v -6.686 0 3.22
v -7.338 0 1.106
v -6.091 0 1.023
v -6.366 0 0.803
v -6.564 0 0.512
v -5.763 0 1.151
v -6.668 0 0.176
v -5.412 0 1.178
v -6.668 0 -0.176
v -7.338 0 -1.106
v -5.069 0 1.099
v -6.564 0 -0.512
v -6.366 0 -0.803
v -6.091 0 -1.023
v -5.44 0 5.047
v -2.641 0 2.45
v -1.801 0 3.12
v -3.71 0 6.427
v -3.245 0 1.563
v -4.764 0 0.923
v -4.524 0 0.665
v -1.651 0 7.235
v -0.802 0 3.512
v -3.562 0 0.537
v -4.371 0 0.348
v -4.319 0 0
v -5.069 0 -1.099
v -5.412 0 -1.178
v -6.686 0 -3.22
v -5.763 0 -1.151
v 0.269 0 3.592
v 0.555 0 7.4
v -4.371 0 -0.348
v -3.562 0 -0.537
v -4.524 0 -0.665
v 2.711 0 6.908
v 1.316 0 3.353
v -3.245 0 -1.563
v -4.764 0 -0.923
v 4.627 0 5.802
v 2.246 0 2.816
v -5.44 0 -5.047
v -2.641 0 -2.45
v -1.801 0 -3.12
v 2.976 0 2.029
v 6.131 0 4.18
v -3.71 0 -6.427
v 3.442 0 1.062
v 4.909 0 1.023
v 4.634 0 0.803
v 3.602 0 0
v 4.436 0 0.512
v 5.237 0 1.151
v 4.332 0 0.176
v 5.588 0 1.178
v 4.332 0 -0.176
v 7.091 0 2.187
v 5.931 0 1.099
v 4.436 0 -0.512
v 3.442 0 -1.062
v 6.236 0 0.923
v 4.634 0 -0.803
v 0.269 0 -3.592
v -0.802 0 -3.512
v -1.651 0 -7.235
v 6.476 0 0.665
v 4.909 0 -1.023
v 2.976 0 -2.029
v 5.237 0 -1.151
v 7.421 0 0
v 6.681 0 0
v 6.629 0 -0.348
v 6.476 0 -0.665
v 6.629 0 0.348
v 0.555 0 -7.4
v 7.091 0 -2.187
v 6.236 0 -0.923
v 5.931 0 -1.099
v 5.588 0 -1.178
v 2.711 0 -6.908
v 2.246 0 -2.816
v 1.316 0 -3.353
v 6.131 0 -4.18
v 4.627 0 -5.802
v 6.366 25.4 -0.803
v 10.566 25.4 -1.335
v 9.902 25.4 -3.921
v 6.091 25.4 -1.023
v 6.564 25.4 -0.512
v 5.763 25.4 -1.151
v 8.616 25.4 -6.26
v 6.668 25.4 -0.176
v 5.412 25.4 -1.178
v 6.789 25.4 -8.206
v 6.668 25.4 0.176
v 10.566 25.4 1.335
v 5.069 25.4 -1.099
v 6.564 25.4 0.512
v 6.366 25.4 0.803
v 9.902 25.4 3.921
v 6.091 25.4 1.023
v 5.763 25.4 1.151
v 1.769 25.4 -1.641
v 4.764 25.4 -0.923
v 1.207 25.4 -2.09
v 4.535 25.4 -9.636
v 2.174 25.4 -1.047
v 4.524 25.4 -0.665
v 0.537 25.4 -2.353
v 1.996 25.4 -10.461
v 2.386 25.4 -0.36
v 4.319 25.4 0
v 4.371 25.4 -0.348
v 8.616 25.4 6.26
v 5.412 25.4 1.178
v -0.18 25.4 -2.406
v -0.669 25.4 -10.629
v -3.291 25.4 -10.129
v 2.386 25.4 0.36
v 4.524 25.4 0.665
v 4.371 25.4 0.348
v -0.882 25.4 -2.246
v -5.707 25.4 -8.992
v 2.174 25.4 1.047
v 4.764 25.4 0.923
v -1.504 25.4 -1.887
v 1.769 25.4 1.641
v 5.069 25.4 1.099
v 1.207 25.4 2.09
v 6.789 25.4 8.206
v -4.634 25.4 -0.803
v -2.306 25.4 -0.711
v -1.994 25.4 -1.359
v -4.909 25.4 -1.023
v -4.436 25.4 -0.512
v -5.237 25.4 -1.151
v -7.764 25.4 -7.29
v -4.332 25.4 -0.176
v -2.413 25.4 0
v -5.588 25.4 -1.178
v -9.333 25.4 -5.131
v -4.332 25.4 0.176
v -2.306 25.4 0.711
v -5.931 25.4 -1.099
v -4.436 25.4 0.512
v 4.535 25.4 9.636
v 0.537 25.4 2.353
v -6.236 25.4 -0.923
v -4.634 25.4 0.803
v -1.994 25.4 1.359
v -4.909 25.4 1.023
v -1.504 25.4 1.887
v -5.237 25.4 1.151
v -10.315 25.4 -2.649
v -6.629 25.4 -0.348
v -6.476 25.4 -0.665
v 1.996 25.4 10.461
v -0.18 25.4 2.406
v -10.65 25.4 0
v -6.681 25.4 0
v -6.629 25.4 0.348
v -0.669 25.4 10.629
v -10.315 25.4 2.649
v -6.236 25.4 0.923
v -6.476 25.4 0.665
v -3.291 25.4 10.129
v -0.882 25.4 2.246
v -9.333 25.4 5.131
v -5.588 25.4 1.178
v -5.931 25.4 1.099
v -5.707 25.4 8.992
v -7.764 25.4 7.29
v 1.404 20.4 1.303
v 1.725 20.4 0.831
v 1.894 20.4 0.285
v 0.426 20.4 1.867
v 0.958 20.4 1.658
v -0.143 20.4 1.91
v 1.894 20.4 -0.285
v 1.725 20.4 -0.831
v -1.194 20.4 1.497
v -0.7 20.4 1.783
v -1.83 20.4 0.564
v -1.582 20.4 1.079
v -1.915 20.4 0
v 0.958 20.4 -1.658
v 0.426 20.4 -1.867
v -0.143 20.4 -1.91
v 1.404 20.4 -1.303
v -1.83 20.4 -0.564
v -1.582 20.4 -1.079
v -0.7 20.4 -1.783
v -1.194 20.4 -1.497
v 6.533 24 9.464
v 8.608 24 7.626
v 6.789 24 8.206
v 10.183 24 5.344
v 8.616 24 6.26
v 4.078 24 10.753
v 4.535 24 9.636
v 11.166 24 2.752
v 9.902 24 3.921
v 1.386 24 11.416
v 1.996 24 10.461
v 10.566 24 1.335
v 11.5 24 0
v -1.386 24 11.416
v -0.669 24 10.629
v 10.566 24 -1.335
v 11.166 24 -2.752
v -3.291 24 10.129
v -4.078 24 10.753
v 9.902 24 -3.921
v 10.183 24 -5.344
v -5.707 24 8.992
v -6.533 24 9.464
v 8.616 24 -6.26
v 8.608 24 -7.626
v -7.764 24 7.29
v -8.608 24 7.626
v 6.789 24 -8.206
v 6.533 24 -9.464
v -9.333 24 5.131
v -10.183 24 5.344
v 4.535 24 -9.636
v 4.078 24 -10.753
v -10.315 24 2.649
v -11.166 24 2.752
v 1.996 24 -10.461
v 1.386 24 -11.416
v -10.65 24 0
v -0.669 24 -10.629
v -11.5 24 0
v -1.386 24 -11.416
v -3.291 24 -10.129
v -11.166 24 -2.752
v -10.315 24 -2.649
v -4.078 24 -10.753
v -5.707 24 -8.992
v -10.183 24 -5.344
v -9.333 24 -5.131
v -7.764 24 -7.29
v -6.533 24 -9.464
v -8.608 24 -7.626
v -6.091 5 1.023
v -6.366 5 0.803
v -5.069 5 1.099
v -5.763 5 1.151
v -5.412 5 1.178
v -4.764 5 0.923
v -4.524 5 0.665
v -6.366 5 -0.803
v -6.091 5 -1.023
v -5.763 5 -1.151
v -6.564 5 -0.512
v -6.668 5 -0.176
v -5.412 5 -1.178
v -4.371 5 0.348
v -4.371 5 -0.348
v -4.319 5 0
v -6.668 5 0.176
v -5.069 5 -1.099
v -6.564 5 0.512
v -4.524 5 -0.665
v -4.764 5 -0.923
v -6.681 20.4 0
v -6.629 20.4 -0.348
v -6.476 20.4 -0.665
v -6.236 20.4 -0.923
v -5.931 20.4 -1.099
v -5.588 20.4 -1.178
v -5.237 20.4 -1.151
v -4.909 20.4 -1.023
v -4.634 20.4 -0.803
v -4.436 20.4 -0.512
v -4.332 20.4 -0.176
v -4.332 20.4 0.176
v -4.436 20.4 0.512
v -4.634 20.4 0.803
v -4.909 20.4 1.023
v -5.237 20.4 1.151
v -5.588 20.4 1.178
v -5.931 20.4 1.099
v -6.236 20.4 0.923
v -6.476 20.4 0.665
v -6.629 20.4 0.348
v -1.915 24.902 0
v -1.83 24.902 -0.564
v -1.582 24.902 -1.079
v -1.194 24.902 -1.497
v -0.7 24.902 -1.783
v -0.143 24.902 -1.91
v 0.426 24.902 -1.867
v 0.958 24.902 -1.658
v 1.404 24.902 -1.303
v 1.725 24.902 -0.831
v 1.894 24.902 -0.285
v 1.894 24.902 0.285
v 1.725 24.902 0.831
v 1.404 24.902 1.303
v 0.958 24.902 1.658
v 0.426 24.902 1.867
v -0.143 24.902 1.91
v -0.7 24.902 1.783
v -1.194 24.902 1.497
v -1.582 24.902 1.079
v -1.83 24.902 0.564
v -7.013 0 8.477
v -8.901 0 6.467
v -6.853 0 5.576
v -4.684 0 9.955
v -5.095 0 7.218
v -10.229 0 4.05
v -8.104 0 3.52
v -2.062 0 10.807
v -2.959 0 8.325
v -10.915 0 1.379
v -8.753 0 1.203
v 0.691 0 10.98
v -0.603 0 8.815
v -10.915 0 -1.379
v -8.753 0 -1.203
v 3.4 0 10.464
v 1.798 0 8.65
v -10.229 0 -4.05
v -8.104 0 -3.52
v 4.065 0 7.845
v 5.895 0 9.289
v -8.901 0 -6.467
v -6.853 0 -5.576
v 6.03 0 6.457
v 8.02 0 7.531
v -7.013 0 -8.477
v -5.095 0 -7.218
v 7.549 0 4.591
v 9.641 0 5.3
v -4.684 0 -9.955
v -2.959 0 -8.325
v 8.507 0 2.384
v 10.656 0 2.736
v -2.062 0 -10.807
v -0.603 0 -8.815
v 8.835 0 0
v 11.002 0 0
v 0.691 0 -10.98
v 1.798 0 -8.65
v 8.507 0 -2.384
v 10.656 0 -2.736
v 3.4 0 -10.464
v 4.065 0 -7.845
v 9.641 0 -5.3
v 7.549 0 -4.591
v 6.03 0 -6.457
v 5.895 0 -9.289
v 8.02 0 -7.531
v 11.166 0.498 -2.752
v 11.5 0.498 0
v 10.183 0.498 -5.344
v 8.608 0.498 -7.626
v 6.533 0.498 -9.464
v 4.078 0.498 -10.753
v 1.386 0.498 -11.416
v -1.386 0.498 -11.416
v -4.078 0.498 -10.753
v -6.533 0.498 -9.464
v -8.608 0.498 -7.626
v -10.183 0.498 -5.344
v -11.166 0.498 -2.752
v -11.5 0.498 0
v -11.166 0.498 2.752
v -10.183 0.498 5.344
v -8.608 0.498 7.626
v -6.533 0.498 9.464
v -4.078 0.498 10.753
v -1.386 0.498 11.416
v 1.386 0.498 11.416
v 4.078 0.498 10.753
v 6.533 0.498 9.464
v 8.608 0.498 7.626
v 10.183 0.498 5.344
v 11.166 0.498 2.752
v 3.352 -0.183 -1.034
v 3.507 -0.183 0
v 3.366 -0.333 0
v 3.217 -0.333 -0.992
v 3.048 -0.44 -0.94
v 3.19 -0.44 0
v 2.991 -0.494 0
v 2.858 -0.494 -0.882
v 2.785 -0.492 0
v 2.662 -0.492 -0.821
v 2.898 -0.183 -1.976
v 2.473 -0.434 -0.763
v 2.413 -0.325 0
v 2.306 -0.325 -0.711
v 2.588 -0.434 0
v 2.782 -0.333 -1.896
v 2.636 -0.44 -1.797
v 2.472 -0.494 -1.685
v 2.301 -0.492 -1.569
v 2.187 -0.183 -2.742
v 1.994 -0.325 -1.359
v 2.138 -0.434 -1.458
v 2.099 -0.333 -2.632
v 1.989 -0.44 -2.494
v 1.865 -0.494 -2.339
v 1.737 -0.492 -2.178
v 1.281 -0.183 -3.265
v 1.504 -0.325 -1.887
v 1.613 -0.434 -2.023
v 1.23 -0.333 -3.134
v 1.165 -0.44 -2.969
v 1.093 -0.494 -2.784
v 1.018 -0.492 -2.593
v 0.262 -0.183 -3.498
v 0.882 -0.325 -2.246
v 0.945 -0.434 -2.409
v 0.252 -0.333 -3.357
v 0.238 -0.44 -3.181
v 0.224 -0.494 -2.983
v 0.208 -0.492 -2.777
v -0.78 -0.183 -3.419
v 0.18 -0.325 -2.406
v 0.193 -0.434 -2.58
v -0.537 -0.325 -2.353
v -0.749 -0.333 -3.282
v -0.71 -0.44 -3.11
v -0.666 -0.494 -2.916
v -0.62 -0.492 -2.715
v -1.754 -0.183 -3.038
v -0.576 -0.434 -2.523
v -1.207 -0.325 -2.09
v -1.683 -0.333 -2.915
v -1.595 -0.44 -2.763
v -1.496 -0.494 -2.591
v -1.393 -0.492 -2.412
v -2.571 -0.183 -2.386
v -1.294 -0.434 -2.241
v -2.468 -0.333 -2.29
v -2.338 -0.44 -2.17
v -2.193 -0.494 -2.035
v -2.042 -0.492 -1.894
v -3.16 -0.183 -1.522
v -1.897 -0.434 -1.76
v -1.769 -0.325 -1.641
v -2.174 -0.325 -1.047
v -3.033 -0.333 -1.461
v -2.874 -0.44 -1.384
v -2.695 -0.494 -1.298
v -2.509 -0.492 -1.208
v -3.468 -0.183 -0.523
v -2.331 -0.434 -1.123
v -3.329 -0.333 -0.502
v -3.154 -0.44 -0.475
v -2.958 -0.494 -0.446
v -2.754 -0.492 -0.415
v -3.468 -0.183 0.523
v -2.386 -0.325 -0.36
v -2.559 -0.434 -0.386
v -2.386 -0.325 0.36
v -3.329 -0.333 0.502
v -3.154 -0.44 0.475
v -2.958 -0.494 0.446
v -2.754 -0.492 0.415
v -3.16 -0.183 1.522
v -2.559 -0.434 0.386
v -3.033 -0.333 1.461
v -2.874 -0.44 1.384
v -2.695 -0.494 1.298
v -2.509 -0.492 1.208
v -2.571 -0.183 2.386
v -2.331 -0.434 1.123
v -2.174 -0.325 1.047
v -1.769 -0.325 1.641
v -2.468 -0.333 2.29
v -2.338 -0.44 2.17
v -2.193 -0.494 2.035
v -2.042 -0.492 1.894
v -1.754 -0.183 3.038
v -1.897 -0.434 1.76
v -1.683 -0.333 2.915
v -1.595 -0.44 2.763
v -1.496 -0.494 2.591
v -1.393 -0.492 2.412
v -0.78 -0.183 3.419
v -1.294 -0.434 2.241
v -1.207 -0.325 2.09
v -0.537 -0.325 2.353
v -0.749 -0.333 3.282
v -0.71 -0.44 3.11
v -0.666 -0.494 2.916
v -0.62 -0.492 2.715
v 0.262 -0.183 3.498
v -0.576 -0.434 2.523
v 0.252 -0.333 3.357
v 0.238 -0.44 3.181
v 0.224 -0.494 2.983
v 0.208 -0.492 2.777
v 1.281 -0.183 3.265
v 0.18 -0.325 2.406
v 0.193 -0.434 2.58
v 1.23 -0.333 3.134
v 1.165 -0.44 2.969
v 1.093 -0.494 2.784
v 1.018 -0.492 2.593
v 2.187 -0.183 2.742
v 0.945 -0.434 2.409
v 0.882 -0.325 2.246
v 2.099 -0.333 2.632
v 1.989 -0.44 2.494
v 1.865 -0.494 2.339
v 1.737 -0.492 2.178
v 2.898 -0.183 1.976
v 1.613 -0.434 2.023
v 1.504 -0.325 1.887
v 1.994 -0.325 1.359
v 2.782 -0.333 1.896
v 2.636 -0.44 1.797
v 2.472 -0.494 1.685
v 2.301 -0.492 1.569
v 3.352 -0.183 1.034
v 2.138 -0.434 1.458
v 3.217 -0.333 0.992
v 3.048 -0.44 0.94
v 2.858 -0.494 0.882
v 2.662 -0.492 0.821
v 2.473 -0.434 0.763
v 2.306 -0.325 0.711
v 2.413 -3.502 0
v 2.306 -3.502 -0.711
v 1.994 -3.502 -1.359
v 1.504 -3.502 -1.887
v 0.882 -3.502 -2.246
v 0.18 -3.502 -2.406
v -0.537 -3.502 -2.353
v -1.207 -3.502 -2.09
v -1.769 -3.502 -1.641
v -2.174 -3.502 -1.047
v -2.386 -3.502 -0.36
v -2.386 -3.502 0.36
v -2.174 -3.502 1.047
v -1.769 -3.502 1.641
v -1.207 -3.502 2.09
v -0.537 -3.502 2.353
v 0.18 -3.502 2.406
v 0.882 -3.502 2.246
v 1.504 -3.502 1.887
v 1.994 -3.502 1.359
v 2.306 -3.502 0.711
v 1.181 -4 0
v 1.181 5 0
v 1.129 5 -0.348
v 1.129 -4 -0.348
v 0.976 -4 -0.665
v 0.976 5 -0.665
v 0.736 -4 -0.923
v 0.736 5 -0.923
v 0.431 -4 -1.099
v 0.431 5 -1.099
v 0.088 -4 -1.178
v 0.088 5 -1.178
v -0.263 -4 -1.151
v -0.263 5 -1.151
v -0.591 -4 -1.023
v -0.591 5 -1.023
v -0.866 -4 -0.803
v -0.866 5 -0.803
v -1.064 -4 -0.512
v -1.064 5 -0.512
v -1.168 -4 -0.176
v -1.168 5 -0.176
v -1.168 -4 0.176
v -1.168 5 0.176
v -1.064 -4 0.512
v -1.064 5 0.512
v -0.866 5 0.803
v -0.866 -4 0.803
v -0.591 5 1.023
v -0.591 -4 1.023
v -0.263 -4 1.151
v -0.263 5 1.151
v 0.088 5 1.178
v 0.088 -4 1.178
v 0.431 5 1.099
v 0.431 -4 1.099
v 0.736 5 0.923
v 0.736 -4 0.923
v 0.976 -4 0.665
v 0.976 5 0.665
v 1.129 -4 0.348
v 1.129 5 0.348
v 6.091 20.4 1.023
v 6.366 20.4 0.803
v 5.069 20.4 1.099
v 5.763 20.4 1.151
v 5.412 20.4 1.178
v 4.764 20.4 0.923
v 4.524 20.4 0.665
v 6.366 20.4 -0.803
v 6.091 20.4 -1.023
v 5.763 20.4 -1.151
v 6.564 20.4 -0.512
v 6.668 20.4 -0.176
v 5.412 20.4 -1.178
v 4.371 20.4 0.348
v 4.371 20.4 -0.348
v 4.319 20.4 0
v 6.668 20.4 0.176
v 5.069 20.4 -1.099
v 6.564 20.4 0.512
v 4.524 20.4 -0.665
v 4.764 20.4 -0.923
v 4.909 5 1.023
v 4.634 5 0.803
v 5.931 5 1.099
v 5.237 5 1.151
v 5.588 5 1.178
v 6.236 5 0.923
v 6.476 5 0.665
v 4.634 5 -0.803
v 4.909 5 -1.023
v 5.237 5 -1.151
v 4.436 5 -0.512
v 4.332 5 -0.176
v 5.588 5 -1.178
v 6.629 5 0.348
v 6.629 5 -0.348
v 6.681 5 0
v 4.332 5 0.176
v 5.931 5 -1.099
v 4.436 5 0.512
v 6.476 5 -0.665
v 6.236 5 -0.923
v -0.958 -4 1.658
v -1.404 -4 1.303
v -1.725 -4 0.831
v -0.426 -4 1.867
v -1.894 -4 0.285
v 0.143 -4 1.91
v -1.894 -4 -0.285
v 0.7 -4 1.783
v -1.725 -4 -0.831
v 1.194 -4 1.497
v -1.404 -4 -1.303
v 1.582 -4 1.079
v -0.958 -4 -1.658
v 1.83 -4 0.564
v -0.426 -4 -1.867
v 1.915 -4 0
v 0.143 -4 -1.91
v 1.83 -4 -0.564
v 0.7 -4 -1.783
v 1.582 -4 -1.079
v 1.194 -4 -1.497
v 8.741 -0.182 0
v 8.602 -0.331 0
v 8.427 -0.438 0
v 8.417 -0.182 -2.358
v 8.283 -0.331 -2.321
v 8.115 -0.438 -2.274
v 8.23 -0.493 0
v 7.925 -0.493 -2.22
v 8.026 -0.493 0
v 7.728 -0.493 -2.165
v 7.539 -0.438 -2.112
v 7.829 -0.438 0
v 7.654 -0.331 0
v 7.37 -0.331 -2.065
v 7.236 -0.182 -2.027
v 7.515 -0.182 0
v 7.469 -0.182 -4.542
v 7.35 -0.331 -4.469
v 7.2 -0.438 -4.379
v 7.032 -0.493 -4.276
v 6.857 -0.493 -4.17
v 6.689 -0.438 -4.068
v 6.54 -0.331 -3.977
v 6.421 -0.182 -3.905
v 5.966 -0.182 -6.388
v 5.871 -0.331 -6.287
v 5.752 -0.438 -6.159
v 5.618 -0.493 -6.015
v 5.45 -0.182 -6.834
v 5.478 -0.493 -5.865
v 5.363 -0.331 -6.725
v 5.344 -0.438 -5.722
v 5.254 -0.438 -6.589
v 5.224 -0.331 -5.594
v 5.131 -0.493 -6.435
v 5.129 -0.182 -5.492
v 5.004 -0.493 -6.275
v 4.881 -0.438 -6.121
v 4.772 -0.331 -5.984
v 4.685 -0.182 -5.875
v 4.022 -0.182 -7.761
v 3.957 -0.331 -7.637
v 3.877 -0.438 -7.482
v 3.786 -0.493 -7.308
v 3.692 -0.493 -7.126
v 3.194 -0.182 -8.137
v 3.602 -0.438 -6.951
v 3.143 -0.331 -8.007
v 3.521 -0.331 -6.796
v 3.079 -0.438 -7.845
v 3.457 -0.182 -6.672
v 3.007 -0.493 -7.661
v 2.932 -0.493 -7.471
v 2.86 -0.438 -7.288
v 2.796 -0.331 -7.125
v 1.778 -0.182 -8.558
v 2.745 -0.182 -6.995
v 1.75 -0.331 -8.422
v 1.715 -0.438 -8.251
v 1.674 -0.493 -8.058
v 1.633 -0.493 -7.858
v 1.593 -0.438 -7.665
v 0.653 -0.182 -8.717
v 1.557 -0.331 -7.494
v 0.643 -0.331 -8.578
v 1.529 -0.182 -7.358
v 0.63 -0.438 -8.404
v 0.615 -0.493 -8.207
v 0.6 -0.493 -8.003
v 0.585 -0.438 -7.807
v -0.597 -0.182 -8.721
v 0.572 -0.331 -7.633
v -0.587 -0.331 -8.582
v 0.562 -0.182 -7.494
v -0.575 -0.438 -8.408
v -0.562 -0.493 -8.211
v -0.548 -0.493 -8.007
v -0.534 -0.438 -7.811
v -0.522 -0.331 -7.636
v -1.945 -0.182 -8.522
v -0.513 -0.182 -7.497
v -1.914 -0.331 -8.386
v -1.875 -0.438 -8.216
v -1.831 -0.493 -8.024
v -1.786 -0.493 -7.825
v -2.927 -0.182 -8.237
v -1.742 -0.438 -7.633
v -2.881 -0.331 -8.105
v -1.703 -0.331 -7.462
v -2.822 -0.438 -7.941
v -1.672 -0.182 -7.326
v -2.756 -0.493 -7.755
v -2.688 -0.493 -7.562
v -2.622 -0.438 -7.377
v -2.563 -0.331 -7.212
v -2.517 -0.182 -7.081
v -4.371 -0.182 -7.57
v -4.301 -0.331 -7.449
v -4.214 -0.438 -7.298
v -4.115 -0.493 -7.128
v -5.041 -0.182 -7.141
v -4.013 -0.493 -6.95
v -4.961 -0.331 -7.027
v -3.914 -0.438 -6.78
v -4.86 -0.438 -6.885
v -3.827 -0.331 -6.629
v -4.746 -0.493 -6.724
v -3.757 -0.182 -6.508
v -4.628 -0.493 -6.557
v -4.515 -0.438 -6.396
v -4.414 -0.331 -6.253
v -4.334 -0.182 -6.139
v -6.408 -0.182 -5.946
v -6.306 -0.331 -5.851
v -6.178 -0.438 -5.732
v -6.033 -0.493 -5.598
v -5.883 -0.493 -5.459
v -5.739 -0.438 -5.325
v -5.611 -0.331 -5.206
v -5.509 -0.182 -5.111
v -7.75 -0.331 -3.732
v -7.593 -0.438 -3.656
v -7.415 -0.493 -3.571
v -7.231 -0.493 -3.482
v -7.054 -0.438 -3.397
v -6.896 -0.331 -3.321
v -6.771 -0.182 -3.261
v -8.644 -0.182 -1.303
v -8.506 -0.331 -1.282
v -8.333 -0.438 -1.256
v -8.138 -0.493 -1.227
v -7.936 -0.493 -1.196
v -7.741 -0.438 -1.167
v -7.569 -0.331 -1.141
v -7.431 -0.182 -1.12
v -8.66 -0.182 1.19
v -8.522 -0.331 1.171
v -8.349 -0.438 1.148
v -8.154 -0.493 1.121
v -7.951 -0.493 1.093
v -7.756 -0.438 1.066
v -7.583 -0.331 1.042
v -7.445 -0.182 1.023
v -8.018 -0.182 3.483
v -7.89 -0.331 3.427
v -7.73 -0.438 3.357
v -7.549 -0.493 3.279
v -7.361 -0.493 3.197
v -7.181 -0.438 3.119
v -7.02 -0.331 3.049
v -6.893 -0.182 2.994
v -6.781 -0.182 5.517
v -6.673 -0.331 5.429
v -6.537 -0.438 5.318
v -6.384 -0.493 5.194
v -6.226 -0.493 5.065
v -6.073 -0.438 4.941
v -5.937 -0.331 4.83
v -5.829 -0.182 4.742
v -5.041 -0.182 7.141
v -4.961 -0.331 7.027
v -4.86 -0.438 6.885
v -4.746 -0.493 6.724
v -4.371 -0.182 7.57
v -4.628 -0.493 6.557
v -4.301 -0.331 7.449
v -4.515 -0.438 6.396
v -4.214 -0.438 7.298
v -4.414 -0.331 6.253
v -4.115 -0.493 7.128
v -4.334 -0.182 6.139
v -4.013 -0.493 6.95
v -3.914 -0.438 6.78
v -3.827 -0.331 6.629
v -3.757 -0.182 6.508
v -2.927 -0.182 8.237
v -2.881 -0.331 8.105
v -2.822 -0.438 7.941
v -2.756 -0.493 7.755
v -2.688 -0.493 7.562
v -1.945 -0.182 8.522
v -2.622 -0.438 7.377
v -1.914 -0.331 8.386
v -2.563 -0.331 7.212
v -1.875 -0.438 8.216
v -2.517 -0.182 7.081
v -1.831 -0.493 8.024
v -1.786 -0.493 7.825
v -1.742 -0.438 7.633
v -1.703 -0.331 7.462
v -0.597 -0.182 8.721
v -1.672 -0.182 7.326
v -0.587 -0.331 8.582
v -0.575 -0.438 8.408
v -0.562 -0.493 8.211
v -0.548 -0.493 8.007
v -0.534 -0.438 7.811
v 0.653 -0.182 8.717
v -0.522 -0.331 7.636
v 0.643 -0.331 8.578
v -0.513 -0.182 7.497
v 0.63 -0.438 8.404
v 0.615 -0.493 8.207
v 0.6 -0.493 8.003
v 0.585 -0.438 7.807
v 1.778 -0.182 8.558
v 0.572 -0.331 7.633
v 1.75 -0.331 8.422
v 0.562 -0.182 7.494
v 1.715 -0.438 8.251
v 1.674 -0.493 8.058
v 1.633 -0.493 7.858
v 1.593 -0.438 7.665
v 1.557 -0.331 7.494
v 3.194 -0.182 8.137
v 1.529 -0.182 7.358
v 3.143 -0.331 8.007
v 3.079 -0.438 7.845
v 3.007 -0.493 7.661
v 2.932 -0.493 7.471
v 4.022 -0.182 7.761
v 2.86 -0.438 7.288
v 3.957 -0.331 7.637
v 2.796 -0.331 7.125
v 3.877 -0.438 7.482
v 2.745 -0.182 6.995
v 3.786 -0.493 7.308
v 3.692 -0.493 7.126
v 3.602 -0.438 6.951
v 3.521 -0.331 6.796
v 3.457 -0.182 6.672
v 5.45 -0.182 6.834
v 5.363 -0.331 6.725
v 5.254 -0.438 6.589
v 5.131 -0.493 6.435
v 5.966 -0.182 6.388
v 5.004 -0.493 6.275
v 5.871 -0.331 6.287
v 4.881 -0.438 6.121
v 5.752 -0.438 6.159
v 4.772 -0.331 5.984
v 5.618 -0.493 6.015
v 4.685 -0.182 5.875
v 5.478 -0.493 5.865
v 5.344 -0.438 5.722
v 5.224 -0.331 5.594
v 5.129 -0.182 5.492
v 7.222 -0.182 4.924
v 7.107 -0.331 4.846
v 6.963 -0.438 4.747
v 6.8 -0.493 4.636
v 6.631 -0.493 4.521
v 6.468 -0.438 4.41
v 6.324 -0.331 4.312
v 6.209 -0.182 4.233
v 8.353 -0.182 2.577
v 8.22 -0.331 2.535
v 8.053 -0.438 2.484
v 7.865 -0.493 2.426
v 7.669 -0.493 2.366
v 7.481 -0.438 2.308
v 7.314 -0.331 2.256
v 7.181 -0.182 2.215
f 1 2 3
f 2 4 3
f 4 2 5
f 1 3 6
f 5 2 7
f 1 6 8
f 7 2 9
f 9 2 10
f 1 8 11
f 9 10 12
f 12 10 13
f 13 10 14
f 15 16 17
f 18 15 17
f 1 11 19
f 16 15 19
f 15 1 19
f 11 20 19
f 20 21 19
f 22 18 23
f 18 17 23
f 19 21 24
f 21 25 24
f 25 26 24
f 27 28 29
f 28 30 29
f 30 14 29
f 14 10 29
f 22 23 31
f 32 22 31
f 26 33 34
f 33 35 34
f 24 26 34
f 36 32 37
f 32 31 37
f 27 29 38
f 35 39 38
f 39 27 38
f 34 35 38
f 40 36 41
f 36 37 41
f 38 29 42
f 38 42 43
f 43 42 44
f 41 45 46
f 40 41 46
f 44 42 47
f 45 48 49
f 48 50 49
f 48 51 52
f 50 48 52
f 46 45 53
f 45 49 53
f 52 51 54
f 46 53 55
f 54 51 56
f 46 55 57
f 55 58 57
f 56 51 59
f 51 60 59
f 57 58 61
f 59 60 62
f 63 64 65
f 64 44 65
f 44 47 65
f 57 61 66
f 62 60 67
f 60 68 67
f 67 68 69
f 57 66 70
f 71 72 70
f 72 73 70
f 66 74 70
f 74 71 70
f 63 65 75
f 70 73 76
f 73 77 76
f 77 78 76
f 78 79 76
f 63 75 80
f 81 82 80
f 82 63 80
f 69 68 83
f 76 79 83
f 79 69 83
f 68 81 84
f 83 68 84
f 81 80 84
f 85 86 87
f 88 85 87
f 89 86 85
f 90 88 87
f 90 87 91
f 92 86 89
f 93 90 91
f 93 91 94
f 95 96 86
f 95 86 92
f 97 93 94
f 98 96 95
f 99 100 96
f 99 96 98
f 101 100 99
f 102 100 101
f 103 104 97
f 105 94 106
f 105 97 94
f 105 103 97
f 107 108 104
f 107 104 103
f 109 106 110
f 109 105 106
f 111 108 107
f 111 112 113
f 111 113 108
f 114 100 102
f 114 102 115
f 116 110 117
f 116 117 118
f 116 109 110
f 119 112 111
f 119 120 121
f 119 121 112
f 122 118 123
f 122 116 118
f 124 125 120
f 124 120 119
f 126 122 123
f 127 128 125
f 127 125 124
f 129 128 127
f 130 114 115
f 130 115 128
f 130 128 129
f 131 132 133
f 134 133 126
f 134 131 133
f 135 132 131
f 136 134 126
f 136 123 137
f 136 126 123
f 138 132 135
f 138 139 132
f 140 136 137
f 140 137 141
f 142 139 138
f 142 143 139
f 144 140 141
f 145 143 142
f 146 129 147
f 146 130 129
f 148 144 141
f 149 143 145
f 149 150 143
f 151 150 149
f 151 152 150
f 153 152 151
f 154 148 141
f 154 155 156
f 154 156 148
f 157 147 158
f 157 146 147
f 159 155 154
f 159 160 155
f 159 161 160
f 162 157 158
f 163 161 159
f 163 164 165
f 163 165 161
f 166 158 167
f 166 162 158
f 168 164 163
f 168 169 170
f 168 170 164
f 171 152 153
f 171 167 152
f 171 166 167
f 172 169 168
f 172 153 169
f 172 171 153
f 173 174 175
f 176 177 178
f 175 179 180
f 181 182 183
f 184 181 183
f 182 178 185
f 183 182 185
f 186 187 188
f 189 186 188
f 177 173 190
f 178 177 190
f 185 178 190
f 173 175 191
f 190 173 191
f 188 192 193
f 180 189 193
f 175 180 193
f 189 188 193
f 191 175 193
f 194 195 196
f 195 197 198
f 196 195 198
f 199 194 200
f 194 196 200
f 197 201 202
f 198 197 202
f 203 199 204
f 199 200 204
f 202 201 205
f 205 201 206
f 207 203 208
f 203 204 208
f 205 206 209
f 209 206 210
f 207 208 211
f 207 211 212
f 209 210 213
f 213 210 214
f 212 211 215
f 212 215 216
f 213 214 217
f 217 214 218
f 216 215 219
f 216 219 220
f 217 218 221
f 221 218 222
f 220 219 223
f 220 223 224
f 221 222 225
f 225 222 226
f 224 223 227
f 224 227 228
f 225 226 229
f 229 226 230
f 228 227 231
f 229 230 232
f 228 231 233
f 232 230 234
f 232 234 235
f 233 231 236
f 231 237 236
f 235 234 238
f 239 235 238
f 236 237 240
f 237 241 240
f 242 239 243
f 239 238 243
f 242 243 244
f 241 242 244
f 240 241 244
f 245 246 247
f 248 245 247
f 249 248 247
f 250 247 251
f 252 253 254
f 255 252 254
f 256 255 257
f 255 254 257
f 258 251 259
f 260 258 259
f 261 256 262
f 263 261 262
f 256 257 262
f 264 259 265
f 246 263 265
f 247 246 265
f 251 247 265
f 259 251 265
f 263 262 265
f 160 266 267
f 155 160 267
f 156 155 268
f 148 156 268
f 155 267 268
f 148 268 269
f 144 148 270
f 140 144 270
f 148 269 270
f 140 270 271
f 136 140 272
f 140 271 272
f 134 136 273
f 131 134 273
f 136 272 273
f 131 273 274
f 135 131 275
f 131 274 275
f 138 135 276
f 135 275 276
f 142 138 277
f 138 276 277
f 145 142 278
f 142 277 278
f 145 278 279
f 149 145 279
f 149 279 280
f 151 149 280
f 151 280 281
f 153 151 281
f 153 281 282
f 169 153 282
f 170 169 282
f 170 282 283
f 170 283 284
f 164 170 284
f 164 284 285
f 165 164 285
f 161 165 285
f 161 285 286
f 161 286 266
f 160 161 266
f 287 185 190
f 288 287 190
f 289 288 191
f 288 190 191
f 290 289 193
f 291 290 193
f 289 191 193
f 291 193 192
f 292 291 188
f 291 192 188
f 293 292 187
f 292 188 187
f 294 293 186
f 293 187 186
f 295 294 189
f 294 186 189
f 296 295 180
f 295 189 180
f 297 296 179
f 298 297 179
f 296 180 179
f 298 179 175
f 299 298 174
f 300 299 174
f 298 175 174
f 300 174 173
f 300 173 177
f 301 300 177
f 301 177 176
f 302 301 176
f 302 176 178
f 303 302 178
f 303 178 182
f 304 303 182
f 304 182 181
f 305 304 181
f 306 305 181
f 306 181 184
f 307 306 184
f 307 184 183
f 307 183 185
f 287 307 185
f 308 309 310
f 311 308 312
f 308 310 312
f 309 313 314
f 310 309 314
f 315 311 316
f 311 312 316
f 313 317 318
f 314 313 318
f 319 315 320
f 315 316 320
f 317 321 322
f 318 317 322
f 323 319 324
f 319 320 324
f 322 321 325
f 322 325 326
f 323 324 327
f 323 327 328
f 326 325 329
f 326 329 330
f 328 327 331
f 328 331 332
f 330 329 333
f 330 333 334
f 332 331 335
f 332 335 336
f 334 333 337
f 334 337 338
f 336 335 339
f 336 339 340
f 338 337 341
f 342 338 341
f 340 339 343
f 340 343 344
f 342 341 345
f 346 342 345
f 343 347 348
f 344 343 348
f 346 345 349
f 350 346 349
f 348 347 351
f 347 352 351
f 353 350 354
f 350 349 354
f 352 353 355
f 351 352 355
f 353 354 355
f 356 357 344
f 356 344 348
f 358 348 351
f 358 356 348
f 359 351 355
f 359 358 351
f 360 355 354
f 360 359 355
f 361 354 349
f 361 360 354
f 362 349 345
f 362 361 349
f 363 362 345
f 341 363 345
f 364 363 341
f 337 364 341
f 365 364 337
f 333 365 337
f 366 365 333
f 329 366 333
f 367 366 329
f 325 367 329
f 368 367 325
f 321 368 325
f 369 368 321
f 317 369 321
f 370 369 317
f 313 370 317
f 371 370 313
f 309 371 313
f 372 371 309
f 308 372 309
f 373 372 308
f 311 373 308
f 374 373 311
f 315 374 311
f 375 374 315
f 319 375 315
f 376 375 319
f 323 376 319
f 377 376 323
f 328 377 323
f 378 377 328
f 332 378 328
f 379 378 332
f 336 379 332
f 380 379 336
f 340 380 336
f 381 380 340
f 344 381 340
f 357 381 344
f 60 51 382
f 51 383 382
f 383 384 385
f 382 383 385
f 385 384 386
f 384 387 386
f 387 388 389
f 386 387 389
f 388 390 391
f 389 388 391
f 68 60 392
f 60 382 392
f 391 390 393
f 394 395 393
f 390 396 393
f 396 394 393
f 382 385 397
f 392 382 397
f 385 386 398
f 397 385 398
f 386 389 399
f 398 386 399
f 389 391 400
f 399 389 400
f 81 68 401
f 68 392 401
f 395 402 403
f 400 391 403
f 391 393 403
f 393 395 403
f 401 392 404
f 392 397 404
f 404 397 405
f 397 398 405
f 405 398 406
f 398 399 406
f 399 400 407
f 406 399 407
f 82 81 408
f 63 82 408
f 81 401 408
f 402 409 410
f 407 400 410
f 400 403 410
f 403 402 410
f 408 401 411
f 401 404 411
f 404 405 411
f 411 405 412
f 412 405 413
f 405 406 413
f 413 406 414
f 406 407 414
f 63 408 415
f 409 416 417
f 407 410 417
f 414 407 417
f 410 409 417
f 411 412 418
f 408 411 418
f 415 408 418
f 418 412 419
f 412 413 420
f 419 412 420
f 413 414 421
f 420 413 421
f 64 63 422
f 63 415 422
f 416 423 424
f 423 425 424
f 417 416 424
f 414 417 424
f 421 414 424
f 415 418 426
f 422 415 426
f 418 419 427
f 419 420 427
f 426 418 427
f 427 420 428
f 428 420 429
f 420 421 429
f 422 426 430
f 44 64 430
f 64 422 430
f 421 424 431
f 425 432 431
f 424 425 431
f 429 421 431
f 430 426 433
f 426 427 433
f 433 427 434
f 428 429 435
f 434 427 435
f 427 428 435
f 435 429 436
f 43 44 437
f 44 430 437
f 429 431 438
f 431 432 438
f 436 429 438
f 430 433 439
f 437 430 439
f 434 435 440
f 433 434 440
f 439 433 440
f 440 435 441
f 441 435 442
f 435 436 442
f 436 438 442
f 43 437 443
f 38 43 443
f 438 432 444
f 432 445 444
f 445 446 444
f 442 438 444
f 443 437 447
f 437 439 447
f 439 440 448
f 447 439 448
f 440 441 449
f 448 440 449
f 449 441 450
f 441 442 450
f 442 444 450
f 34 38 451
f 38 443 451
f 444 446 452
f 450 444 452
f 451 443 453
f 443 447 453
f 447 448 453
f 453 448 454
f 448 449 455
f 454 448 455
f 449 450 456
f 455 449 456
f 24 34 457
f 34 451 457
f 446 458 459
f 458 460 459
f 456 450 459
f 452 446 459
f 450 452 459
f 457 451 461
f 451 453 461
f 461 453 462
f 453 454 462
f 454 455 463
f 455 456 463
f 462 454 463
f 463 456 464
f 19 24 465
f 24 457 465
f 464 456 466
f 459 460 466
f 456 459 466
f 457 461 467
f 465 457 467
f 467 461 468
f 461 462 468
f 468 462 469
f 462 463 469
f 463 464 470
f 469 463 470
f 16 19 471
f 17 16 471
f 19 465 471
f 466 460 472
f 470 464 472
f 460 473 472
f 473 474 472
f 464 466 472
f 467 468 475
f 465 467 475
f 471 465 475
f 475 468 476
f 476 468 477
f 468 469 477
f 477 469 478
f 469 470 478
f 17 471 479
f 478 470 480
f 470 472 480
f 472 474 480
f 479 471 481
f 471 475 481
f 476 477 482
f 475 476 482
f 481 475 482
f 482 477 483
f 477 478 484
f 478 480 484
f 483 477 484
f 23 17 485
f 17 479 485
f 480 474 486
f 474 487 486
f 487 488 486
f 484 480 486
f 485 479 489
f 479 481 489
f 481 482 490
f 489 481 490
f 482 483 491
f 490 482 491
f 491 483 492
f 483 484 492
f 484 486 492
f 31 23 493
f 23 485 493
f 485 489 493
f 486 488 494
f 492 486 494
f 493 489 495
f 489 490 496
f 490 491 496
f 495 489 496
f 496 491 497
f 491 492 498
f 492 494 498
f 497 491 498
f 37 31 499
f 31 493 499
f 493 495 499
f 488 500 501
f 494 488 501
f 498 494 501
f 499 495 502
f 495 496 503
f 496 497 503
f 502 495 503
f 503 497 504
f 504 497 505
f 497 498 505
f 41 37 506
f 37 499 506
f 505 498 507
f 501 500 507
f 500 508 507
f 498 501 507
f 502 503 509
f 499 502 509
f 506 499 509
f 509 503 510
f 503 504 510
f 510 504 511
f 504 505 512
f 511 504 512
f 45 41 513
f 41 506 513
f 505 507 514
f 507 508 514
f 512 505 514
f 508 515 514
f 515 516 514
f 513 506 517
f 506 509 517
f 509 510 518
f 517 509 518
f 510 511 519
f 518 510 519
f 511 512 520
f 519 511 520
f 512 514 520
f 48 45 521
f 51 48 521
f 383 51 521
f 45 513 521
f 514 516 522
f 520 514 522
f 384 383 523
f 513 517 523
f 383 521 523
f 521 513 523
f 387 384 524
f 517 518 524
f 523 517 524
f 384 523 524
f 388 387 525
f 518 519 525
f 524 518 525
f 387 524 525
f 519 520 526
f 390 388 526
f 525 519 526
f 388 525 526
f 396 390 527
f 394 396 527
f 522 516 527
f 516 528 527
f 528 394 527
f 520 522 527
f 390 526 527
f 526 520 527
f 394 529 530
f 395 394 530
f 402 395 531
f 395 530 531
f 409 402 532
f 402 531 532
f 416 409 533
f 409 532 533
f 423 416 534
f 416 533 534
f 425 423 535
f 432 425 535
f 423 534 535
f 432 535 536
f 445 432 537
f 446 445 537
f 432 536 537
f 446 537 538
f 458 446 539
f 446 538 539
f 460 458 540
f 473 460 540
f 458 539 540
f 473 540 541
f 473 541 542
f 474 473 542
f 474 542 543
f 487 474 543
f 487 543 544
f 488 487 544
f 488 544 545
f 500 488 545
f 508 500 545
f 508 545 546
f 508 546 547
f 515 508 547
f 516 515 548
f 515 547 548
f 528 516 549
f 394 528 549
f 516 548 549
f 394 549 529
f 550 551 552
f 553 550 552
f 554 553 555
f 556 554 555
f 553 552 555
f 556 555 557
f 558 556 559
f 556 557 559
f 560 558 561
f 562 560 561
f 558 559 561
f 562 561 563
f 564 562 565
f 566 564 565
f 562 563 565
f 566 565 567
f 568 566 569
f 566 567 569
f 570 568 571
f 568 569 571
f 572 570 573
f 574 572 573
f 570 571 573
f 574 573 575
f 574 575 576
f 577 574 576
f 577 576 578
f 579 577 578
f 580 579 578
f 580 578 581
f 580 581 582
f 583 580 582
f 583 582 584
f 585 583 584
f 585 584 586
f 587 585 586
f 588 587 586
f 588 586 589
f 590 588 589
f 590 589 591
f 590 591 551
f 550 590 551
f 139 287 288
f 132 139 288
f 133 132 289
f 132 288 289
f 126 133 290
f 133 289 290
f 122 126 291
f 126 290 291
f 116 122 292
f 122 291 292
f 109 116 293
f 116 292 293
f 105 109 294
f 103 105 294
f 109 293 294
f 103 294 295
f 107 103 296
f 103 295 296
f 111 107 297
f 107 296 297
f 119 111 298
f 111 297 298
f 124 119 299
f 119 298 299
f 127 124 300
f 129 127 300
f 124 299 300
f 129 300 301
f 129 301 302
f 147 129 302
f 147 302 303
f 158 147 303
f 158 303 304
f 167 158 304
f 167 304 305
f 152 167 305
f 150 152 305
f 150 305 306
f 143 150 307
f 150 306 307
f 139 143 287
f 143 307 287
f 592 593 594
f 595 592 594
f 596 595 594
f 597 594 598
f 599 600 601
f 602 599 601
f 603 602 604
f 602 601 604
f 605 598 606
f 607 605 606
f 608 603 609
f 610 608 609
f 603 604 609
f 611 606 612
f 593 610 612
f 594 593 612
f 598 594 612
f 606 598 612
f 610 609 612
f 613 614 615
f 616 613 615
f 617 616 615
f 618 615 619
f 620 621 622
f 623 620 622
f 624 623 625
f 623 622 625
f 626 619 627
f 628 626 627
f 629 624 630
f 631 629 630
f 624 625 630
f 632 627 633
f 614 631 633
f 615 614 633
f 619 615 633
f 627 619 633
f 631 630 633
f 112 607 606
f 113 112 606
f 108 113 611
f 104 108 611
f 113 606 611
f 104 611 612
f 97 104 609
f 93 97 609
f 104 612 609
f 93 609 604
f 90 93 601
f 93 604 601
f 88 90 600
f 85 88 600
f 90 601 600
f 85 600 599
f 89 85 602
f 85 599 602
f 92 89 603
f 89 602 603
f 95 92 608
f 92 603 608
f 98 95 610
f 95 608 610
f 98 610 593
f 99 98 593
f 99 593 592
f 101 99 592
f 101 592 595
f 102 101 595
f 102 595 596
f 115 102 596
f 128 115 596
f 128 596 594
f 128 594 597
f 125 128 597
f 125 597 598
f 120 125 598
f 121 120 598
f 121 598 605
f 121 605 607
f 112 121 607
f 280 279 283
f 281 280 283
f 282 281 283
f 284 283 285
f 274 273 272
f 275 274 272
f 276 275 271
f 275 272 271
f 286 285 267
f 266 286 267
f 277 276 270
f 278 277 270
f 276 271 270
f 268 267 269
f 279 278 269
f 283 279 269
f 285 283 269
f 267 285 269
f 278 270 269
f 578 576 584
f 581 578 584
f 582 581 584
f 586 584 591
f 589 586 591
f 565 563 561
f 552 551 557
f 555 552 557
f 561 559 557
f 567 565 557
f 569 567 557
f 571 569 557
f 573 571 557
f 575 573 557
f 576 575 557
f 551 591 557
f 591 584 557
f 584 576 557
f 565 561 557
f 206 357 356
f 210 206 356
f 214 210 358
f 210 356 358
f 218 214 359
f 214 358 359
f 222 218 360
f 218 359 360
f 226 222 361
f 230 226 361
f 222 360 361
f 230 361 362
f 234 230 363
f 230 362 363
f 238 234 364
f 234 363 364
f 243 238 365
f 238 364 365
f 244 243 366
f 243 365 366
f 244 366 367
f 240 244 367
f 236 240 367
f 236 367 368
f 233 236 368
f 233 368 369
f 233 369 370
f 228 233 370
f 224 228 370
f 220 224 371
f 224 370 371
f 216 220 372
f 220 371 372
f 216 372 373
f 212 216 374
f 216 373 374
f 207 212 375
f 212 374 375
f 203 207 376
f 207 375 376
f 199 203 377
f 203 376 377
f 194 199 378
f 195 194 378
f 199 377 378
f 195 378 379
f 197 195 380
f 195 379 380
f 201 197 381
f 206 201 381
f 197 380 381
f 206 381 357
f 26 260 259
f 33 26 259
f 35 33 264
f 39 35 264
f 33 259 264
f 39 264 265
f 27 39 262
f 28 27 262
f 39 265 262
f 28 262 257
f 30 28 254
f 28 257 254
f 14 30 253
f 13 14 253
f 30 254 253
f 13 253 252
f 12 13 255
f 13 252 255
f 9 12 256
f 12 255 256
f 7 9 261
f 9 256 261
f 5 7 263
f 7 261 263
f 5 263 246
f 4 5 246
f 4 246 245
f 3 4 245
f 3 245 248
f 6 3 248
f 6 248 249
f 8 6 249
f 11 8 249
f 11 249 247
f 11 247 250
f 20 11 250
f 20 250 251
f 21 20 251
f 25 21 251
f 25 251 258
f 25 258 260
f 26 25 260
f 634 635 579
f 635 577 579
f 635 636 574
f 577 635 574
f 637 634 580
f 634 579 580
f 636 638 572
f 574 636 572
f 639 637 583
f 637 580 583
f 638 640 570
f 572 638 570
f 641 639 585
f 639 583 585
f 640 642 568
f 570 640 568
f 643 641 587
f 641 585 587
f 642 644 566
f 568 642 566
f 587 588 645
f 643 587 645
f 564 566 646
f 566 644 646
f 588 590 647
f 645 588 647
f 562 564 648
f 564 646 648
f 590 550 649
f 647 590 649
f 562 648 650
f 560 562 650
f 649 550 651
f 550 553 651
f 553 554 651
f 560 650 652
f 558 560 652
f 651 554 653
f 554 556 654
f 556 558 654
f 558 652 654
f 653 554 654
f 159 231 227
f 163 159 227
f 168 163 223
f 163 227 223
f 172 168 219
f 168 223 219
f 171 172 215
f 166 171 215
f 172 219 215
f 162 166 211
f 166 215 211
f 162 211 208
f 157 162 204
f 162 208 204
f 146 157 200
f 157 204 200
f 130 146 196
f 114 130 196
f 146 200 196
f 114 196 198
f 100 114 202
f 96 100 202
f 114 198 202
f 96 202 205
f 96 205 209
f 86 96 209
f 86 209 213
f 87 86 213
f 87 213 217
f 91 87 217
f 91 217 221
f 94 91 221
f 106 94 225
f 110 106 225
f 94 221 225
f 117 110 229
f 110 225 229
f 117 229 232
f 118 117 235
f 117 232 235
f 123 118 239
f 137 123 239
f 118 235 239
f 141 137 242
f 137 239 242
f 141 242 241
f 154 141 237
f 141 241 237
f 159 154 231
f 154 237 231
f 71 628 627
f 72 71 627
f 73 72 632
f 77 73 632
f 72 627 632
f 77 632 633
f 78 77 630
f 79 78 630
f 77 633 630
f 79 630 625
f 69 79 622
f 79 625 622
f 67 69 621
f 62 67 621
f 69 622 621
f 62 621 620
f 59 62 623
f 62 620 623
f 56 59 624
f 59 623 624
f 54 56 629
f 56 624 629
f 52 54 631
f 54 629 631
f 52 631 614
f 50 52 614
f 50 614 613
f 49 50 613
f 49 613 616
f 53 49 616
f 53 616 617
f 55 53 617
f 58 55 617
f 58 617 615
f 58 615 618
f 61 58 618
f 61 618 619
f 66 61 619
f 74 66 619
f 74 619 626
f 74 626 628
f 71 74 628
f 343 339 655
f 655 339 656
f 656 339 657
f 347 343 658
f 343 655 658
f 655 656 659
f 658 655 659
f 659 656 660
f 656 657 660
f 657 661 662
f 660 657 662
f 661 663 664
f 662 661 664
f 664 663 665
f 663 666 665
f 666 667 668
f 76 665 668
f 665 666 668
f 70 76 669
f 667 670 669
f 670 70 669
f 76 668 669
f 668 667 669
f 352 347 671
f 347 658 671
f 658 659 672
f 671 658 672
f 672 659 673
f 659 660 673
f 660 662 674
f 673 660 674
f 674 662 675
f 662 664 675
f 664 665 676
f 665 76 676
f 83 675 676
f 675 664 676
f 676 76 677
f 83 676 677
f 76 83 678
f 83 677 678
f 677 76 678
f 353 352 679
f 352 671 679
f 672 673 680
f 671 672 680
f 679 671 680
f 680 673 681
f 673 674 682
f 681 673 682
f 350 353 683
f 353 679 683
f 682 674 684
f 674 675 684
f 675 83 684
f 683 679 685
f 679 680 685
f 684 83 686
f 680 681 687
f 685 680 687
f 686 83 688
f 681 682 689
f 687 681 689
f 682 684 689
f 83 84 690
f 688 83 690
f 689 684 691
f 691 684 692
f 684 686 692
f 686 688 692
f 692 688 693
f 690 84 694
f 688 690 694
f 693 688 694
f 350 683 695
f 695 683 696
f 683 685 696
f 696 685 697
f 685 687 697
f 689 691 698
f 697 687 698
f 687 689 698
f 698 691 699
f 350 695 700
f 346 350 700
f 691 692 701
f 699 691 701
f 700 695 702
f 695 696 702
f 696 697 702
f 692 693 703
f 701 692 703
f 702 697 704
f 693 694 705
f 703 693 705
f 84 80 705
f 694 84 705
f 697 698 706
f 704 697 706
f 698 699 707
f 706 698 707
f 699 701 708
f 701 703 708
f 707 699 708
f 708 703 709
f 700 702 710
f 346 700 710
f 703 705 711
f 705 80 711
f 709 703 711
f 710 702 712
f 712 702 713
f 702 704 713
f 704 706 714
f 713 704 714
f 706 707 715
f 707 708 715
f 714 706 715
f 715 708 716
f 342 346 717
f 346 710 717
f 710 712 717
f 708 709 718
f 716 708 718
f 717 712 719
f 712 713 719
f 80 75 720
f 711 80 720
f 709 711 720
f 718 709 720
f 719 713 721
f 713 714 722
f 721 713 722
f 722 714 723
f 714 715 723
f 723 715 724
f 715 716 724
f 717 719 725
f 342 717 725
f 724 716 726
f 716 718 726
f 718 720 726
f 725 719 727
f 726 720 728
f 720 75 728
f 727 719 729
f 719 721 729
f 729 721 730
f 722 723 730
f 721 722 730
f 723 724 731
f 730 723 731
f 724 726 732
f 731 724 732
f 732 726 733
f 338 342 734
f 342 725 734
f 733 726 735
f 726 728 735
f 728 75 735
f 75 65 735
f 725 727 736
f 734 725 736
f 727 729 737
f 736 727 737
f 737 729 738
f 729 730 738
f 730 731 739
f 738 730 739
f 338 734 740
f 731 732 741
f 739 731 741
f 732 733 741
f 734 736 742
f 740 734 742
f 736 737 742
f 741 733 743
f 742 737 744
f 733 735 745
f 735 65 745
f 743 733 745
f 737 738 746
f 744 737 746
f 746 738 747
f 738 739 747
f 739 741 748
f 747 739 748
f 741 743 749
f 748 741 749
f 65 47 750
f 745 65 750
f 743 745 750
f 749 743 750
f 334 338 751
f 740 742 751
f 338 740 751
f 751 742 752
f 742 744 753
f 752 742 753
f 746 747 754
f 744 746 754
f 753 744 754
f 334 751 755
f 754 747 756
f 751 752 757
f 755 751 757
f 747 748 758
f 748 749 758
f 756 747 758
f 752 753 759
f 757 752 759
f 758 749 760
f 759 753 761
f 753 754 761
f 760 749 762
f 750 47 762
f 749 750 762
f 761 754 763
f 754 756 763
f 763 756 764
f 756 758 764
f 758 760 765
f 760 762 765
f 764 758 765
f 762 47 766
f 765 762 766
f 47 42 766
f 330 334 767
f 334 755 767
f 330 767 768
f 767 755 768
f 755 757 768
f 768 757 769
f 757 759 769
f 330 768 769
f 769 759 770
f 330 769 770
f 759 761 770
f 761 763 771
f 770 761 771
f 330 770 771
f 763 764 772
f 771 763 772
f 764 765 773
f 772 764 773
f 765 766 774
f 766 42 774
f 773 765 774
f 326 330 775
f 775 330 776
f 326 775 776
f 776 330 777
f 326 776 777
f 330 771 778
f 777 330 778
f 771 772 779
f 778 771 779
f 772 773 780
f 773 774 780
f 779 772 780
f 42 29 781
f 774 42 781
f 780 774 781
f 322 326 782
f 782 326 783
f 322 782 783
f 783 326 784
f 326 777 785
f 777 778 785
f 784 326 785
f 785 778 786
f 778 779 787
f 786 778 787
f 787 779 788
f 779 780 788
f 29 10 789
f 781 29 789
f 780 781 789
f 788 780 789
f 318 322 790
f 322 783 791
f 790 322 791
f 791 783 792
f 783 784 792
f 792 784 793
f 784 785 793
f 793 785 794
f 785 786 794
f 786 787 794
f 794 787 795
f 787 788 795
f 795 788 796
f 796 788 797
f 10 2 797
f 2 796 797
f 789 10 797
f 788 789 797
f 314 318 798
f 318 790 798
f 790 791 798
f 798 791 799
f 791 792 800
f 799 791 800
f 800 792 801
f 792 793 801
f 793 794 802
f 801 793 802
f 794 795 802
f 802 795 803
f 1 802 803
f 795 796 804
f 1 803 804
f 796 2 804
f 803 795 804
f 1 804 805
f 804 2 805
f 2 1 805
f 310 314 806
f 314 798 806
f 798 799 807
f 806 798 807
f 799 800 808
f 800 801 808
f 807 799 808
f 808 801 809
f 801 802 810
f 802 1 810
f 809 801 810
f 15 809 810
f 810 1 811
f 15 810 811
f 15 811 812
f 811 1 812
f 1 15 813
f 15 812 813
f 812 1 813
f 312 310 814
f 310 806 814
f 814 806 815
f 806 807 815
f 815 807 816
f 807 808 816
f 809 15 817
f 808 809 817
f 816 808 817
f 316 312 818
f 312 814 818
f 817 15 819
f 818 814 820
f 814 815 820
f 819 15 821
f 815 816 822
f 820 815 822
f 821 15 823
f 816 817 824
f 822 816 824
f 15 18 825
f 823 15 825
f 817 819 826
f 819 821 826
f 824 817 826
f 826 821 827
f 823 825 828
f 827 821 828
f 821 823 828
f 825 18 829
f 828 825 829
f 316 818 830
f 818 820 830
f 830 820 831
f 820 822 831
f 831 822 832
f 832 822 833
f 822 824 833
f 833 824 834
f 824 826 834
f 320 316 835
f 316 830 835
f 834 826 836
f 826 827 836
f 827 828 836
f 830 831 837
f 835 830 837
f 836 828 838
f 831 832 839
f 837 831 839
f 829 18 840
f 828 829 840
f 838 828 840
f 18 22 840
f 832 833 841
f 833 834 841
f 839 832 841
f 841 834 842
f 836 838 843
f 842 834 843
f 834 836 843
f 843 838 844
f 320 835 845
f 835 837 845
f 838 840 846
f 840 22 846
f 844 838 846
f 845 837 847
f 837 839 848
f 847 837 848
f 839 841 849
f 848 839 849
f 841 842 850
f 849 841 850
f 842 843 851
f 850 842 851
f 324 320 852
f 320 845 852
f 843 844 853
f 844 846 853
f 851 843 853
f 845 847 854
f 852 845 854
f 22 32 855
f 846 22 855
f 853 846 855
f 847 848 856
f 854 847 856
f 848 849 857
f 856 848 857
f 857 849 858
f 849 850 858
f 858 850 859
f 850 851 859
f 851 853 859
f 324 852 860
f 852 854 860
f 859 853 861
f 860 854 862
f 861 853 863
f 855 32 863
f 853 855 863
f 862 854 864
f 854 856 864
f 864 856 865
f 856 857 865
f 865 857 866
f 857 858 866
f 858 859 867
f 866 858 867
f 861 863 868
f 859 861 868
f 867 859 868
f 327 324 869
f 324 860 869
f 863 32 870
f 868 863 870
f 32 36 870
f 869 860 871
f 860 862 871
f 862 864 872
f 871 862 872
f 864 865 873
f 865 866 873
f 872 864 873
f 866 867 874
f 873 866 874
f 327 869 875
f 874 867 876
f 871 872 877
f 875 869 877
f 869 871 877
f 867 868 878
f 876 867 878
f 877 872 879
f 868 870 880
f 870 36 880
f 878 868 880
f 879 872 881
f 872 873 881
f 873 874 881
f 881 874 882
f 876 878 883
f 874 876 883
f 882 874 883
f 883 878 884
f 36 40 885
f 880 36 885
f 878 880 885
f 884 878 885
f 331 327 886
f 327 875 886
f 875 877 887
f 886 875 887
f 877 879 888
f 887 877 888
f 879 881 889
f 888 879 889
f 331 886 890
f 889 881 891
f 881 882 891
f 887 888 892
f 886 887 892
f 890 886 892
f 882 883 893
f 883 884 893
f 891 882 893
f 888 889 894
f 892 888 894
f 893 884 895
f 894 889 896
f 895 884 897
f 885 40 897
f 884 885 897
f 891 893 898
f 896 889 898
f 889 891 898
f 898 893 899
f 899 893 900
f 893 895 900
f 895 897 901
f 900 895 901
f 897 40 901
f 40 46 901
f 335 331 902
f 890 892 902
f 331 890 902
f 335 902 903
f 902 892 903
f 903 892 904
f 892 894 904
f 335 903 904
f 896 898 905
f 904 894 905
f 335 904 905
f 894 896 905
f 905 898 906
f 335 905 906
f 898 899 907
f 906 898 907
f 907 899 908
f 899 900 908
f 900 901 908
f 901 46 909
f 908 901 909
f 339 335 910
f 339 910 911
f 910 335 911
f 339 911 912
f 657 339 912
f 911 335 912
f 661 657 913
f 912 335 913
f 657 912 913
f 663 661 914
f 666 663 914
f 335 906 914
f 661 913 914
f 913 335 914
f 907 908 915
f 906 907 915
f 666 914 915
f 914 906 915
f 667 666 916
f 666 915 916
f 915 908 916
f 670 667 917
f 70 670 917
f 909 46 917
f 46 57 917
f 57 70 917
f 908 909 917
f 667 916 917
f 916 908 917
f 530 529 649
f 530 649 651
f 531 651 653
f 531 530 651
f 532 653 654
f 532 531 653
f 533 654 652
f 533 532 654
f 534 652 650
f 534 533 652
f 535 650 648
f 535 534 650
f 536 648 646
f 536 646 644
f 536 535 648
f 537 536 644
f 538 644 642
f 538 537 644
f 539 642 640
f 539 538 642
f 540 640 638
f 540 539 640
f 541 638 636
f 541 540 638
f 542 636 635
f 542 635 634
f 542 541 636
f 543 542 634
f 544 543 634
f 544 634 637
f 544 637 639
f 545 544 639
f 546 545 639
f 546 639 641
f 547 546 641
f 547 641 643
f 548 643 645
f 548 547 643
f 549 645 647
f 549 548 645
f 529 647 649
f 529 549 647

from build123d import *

# Parameters (mm, degrees)
SKETCH2_R                  = 10.65
BOSS_EXTRUDE1_DEPTH        = 1.4
M2_CLEARANCE_HOLE1_D       = 2.362
M2_CLEARANCE_HOLE1_DEPTH   = 5
M2_CLEARANCE_HOLE2_D       = 2.362
M2_CLEARANCE_HOLE2_DEPTH   = 9
M3_5_CLEARANCE_HOLE1_D     = 3.83
M3_5_CLEARANCE_HOLE1_DEPTH = 5
M2_CLEARANCE_HOLE3_D       = 2.362
M2_CLEARANCE_HOLE3_DEPTH   = 5
CHAMFER1_SIZE              = 0.498


with BuildPart() as part:
    # Sketch1 → Revolve1 (revolve)
    with BuildSketch(Plane(origin=(0, 0, 0), x_dir=(-1, 0, 0), z_dir=(0, 0, -1))):
        with BuildLine():
            Line((-2.413, -4), (0, -4))
            Line((0, -4), (0, 24))
            Line((0, 24), (-11.5, 24))
            Line((-11.5, 24), (-11.5, 0))
            Line((-11.5, 0), (-8.835106781, 0))
            ThreePointArc((-8.835106781, 0), (-8.128, -0.5), (-7.420893219, 0))
            Line((-7.420893219, 0), (-3.602106781, 0))
            ThreePointArc((-3.602106781, 0), (-3.092512244, -0.473525337), (-2.413, -0.324609433))
            Line((-2.413, -0.324609433), (-2.413, -4))
        make_face()
    revolve(axis=Axis((0, -4, 0), (0, 1, 0)))

    # Sketch2 → Boss-Extrude1 (add)
    with BuildSketch(Plane(origin=(0, 24, 0), x_dir=(-1, 0, 0), z_dir=(0, 1, 0))):
        Circle(SKETCH2_R)
    extrude(amount=BOSS_EXTRUDE1_DEPTH)

    # M2 Clearance Hole1
    with Locations(Plane(origin=(0, 0, 0), x_dir=(-1, 0, 0), z_dir=(0, -1, 0))):
        with Locations((-5.5, 0), (5.5, 0)):
            Hole(M2_CLEARANCE_HOLE1_D / 2, depth=M2_CLEARANCE_HOLE1_DEPTH)

    # M2 Clearance Hole2
    with Locations(Plane(origin=(0, -4, 0), x_dir=(-1, 0, 0), z_dir=(0, -1, 0))):
        with Locations((0, 0)):
            Hole(M2_CLEARANCE_HOLE2_D / 2, depth=M2_CLEARANCE_HOLE2_DEPTH)

    # M3.5 Clearance Hole1
    with Locations(Plane(origin=(0, 25.4, 0), x_dir=(1, 0, 0), z_dir=(0, 1, 0))):
        with Locations((0, 0)):
            Hole(M3_5_CLEARANCE_HOLE1_D / 2, depth=M3_5_CLEARANCE_HOLE1_DEPTH)

    # M2 Clearance Hole3
    with Locations(Plane(origin=(0, 25.4, 0), x_dir=(1, 0, 0), z_dir=(0, 1, 0))):
        with Locations((5.5, 0), (-5.5, 0)):
            Hole(M2_CLEARANCE_HOLE3_D / 2, depth=M2_CLEARANCE_HOLE3_DEPTH)

    # Chamfer1
    chamfer1_edges = [part.edges().sort_by_distance(p)[0] for p in [
        (-2.413, -4, 0),
        (1.915, 25.4, 0),
        (-11.5, 0, 0),
    ]]
    chamfer(chamfer1_edges, length=CHAMFER1_SIZE)


solid = part.part
